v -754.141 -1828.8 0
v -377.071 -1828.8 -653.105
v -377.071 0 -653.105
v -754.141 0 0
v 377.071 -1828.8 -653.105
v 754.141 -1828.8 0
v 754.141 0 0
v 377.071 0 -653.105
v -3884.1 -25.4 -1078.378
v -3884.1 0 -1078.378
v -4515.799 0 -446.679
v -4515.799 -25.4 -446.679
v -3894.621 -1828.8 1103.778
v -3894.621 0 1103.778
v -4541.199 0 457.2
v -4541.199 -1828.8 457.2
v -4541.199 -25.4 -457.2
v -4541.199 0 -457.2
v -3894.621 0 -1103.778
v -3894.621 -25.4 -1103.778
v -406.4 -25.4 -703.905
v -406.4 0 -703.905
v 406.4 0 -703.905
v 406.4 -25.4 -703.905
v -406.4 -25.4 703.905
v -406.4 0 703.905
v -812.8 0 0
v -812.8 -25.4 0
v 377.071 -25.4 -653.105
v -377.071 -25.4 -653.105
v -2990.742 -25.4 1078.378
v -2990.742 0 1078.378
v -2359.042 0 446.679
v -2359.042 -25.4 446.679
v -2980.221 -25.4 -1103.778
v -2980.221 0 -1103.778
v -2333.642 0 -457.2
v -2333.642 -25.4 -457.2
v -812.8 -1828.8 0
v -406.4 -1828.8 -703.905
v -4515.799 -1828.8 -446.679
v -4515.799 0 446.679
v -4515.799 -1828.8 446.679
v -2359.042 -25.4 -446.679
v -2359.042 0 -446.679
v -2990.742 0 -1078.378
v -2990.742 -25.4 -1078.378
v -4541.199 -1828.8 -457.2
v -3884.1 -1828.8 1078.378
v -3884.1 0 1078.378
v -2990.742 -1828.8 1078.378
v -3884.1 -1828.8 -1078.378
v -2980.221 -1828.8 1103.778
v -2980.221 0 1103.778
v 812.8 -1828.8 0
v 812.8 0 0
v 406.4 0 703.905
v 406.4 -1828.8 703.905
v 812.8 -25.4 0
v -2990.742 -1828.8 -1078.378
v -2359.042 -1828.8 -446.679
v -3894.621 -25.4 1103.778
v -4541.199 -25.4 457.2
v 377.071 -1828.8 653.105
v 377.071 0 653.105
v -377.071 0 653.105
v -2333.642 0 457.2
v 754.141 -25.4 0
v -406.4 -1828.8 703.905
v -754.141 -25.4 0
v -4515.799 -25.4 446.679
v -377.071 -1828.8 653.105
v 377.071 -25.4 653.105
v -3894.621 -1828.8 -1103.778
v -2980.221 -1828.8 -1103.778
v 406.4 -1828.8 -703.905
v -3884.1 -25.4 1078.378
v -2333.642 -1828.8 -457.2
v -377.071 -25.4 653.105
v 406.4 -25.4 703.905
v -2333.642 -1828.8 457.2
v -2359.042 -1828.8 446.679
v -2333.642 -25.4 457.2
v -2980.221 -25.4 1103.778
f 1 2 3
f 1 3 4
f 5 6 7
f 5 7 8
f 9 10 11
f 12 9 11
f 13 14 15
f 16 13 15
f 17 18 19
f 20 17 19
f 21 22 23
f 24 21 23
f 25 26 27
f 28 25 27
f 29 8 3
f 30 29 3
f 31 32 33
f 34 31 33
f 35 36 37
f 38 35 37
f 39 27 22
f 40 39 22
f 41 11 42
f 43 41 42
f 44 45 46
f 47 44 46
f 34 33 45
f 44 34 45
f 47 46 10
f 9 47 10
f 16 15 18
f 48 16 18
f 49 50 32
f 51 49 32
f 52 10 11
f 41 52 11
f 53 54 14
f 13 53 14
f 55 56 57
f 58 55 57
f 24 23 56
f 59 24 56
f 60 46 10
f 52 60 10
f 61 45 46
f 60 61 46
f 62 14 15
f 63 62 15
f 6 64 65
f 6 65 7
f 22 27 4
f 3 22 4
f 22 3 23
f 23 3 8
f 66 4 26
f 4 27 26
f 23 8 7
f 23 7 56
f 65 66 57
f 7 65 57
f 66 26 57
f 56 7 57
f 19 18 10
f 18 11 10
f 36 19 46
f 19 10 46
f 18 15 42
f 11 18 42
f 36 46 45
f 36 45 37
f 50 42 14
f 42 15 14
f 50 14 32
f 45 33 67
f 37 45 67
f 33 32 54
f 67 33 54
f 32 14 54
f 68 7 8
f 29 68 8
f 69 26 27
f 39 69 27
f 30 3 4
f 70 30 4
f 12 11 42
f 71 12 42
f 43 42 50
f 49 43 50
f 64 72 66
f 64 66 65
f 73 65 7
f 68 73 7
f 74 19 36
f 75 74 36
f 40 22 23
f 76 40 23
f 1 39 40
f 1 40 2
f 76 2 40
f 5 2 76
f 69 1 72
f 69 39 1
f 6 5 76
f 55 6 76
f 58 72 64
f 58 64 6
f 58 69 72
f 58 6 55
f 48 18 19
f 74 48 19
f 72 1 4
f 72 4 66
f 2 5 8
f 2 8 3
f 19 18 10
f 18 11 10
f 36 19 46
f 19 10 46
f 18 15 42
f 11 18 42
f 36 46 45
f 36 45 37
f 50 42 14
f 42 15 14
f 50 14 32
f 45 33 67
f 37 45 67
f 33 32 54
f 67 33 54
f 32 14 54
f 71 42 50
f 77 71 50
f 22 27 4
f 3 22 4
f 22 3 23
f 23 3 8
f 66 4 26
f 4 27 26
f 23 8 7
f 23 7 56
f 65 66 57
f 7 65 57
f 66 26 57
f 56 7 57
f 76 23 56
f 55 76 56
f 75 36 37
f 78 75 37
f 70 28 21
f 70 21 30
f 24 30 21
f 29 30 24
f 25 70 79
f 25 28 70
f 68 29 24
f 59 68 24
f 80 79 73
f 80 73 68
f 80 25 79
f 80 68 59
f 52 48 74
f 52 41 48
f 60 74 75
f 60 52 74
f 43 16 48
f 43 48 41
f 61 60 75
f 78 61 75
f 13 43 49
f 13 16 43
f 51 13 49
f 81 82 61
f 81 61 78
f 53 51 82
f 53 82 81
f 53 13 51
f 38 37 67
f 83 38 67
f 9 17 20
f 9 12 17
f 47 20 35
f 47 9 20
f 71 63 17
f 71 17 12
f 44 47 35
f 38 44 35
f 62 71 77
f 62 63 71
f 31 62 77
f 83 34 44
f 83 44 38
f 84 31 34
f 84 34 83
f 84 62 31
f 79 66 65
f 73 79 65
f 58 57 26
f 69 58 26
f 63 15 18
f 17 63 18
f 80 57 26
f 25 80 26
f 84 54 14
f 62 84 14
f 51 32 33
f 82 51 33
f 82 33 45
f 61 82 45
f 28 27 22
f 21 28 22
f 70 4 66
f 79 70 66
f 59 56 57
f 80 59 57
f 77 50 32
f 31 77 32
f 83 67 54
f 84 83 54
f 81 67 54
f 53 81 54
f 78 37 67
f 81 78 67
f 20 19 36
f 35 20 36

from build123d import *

# Parameters (mm, degrees)
F1_DEPTH = 1828.8
F2_DEPTH = 25.4


with BuildPart() as f1:
    # F0 (on Front) → F1 (new body)
    with BuildSketch(Plane.XZ):
        Polygon((406.4, -703.905448), (812.8, 0), (406.4, 703.905448), (-406.4, 703.905448), (-812.8, 0), (-406.4, -703.905448), align=None)
        Polygon((-377.070606, -653.105448), (-754.141213, 0), (-377.070606, 653.105448), (377.070606, 653.105448), (754.141213, 0), (377.070606, -653.105448), align=None, mode=Mode.SUBTRACT)
        Polygon((-3894.620845, -1103.778441), (-2980.220845, -1103.778441), (-2333.642404, -457.2), (-2333.642404, 457.2), (-2980.220845, 1103.778441), (-3894.620845, 1103.778441), (-4541.199286, 457.2), (-4541.199286, -457.2), align=None)
        Polygon((-4515.799286, -446.678976), (-4515.799286, 446.678976), (-3884.099821, 1078.378441), (-2990.74187, 1078.378441), (-2359.042404, 446.678976), (-2359.042404, -446.678976), (-2990.74187, -1078.378441), (-3884.099821, -1078.378441), align=None, mode=Mode.SUBTRACT)
    extrude(amount=F1_DEPTH)


with BuildPart() as f2:
    # F0 (on Front) → F2 (new body)
    with BuildSketch(Plane.XZ):
        Polygon((406.4, -703.905448), (812.8, 0), (406.4, 703.905448), (-406.4, 703.905448), (-812.8, 0), (-406.4, -703.905448), align=None)
        Polygon((-377.070606, -653.105448), (-754.141213, 0), (-377.070606, 653.105448), (377.070606, 653.105448), (754.141213, 0), (377.070606, -653.105448), align=None, mode=Mode.SUBTRACT)
        Polygon((-3894.620845, -1103.778441), (-2980.220845, -1103.778441), (-2333.642404, -457.2), (-2333.642404, 457.2), (-2980.220845, 1103.778441), (-3894.620845, 1103.778441), (-4541.199286, 457.2), (-4541.199286, -457.2), align=None)
        Polygon((-4515.799286, -446.678976), (-4515.799286, 446.678976), (-3884.099821, 1078.378441), (-2990.74187, 1078.378441), (-2359.042404, 446.678976), (-2359.042404, -446.678976), (-2990.74187, -1078.378441), (-3884.099821, -1078.378441), align=None, mode=Mode.SUBTRACT)
    extrude(amount=F2_DEPTH)


solid = Compound([f1.part, f2.part])
